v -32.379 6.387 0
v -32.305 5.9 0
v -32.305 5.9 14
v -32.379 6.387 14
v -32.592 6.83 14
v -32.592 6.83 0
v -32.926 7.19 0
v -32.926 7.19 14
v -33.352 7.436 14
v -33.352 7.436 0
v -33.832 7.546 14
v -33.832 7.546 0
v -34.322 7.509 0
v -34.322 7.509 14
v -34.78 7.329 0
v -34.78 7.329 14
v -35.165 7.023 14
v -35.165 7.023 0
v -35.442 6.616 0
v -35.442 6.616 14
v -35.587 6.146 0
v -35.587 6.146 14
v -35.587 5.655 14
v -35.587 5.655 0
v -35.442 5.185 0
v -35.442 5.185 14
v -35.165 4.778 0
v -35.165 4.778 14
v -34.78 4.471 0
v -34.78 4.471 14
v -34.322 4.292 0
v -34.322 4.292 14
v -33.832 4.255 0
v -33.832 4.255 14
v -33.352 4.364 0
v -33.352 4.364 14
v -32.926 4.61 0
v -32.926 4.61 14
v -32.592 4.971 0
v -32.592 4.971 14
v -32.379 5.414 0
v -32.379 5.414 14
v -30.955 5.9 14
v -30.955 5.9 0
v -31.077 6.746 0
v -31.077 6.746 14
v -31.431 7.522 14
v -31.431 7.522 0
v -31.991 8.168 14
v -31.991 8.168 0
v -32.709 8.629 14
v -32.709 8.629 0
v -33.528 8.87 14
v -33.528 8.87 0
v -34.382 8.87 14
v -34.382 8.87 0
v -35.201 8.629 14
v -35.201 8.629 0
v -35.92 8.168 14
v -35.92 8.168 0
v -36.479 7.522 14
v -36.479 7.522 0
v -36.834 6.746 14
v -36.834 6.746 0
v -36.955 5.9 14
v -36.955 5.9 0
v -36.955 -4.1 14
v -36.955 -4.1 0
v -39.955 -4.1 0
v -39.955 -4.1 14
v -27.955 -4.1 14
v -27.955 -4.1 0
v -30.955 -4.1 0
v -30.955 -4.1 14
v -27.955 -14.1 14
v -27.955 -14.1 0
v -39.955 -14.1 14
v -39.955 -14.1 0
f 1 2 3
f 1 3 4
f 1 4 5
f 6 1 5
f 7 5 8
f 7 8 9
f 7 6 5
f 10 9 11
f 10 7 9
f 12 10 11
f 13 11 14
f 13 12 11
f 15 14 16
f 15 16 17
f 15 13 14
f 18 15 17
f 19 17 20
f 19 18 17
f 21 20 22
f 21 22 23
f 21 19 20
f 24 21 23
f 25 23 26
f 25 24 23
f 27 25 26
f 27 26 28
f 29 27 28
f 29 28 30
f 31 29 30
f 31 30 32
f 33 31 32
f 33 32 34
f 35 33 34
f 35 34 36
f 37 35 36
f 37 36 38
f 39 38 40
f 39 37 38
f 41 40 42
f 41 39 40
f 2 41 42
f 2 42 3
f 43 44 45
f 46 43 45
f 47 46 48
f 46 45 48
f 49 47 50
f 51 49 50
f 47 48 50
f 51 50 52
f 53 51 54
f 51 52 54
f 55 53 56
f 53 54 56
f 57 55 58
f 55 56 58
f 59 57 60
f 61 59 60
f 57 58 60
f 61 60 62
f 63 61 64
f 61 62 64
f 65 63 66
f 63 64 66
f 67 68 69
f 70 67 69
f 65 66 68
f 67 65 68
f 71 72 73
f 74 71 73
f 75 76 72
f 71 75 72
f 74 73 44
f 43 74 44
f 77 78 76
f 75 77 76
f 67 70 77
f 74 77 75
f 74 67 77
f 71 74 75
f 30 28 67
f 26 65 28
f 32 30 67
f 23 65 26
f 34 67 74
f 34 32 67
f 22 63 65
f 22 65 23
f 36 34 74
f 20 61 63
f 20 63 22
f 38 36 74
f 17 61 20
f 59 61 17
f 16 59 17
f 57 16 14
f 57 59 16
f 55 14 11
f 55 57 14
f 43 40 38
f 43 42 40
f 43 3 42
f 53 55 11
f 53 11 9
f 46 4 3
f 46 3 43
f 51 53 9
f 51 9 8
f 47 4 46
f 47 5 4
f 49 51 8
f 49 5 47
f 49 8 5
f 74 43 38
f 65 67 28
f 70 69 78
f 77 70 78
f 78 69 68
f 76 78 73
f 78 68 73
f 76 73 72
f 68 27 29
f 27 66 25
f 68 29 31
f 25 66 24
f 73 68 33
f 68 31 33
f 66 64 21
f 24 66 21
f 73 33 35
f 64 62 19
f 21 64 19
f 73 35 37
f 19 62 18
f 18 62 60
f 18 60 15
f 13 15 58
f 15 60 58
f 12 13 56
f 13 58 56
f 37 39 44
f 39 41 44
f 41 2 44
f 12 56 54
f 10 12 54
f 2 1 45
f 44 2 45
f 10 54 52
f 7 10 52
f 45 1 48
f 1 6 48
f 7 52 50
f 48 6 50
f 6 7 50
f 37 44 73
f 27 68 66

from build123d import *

# Parameters (mm, degrees)
F0_R     = 1.65
F1_DEPTH = 14


with BuildPart() as f1:
    # F0 (on Top) → F1 (new body)
    with BuildSketch(Plane.XY):
        with BuildLine():
            Line((-36.955225, -4.099561), (-39.955225, -4.099561))
            Line((-39.955225, -4.099561), (-39.955225, -14.099561))
            Line((-39.955225, -14.099561), (-27.955225, -14.099561))
            Line((-27.955225, -14.099561), (-27.955225, -4.099561))
            Line((-27.955225, -4.099561), (-30.955225, -4.099561))
            Line((-30.955225, -4.099561), (-30.955225, 5.900439))
            ThreePointArc((-30.955225, 5.900439), (-33.955225, 8.900439), (-36.955225, 5.900439))
            Line((-36.955225, 5.900439), (-36.955225, -4.099561))
        make_face()
        with Locations((-33.955225, 5.900439)):
            Circle(F0_R, mode=Mode.SUBTRACT)
    extrude(amount=F1_DEPTH)


solid = f1.part
